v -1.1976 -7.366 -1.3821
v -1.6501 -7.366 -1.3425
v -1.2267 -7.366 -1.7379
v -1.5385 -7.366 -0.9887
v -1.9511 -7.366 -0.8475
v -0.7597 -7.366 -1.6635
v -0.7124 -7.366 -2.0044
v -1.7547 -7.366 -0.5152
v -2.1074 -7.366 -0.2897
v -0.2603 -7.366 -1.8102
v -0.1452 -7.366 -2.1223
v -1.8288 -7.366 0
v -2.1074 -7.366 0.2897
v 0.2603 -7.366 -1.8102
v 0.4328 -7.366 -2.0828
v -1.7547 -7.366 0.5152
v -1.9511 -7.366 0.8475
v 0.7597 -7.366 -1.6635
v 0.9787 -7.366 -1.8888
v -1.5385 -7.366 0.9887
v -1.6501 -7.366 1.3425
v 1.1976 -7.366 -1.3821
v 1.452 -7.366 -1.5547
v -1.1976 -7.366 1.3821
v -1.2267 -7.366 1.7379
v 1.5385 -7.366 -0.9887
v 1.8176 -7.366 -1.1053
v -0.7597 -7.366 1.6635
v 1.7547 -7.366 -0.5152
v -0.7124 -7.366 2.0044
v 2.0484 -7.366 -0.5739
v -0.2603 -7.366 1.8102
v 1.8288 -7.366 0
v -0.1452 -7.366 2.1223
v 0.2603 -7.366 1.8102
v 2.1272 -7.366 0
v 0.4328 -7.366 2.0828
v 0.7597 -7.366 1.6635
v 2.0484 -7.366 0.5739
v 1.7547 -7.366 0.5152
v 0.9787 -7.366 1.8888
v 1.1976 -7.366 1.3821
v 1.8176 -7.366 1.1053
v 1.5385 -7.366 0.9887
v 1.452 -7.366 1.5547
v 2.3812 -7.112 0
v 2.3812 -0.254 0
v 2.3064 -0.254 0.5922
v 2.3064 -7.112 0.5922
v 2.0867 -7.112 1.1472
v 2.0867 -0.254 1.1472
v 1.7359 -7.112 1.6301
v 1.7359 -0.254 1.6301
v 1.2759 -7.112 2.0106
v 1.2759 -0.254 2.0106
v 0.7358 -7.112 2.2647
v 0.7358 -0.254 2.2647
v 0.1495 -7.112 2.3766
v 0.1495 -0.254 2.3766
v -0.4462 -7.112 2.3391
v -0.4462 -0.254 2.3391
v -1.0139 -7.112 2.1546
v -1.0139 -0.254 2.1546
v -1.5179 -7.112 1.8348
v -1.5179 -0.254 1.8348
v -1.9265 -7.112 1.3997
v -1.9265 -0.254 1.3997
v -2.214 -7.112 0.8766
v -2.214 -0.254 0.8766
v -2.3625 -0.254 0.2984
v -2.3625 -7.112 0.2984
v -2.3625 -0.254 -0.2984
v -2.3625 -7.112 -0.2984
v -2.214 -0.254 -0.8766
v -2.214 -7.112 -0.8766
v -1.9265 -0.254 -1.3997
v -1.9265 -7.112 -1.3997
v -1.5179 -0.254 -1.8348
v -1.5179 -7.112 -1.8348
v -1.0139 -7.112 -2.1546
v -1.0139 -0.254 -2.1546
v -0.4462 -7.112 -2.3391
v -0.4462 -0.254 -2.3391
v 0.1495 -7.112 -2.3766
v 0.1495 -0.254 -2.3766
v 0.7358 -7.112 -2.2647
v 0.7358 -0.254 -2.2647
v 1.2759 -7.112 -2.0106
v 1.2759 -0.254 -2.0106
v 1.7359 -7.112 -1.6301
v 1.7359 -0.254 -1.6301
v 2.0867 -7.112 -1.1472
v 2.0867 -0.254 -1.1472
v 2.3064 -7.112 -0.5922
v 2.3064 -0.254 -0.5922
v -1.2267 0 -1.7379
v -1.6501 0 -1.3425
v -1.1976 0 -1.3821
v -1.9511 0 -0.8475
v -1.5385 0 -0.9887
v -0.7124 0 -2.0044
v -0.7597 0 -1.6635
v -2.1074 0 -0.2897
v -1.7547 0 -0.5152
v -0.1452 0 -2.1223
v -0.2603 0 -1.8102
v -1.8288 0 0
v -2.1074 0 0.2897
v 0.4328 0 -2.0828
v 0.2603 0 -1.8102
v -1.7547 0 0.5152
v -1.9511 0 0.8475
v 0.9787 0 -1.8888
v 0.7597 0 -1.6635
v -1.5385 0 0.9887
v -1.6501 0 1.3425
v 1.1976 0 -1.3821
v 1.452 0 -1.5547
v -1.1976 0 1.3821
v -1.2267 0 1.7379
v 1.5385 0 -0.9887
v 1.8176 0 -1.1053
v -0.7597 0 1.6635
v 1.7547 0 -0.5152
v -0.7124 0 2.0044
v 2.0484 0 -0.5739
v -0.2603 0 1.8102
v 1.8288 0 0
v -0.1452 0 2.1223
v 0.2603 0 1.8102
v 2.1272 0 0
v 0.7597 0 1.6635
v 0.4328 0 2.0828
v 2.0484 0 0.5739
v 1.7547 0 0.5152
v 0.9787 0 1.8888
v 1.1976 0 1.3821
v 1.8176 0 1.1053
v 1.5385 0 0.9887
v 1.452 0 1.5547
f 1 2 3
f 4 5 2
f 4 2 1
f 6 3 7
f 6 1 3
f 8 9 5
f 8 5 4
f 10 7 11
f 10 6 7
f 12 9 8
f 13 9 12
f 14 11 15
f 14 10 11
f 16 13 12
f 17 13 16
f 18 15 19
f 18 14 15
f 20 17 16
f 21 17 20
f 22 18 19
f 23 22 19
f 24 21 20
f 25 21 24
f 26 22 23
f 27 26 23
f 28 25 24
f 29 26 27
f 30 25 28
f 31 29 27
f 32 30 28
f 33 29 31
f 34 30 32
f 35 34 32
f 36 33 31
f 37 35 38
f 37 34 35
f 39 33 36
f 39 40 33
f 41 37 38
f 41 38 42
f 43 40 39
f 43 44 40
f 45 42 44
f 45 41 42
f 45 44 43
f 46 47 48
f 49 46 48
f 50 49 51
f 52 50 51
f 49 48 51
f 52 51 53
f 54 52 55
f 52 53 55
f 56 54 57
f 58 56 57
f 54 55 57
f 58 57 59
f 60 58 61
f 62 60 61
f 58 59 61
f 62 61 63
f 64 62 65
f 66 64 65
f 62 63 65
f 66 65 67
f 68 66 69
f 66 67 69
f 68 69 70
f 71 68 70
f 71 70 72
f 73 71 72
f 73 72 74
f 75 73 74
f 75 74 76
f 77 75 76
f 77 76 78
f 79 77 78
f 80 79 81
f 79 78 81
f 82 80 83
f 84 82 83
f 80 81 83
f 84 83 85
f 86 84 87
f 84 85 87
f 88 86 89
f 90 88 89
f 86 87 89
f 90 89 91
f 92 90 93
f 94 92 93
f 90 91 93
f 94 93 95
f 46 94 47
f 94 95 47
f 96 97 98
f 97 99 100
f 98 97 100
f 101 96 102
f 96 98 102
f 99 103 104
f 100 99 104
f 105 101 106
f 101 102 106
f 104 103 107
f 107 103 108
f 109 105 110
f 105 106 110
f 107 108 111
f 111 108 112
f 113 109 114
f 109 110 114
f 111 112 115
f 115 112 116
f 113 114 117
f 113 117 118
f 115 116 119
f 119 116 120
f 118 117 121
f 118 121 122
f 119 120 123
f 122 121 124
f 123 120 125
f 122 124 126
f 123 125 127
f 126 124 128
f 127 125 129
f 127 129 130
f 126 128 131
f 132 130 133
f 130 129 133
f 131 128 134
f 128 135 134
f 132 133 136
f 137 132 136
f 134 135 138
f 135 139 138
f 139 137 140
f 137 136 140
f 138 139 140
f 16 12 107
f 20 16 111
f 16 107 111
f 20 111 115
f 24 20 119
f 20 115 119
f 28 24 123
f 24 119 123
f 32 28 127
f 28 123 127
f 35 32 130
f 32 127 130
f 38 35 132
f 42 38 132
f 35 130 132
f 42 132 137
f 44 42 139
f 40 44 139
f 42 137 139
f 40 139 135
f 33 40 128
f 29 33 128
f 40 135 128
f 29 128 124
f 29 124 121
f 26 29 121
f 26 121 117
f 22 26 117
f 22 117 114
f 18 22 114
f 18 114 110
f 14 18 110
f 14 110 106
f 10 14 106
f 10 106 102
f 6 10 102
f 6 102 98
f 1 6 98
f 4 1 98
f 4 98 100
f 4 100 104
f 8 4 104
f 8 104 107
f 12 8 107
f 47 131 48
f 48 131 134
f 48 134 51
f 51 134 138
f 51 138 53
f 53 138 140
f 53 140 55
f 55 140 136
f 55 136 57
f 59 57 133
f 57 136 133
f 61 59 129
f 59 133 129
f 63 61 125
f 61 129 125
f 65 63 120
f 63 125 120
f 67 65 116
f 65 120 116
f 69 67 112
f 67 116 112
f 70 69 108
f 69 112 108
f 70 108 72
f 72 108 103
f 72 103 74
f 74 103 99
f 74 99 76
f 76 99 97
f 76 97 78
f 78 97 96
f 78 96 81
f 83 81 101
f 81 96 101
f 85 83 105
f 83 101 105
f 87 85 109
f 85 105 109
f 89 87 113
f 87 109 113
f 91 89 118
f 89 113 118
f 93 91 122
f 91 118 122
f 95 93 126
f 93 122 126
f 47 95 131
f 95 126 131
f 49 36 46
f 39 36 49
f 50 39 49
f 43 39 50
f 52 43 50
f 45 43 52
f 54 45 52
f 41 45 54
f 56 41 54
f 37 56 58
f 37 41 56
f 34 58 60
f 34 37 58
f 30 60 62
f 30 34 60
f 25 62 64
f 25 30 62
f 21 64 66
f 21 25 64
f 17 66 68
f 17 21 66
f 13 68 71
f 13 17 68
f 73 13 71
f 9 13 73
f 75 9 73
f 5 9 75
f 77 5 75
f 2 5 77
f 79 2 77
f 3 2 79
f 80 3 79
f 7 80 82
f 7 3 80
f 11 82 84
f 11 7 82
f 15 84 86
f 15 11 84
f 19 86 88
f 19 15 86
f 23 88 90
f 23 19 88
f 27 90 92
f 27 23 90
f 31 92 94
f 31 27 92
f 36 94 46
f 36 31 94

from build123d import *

# Parameters (mm, degrees)
F0_R     = 2.38125
F1_DEPTH = 7.366
F3_D     = 3.6576
F4_SIZE2 = 0.254
F4_SIZE  = 0.254


with BuildPart() as f1:
    # F0 (on Front) → F1 (new body)
    with BuildSketch(Plane.XZ):
        Circle(F0_R)
    extrude(amount=F1_DEPTH)

    # F3 (through all)
    with Locations(Plane.XZ.offset(7.366)):
        with Locations((0, 0)):
            Hole(F3_D / 2)

    # F4
    f4_edges = [f1.edges().sort_by_distance(p)[0] for p in [
        (-2.38125, -7.366, 0),
        (-2.38125, 0, 0),
    ]]
    chamfer(f4_edges, length=F4_SIZE, length2=F4_SIZE2)


solid = f1.part
